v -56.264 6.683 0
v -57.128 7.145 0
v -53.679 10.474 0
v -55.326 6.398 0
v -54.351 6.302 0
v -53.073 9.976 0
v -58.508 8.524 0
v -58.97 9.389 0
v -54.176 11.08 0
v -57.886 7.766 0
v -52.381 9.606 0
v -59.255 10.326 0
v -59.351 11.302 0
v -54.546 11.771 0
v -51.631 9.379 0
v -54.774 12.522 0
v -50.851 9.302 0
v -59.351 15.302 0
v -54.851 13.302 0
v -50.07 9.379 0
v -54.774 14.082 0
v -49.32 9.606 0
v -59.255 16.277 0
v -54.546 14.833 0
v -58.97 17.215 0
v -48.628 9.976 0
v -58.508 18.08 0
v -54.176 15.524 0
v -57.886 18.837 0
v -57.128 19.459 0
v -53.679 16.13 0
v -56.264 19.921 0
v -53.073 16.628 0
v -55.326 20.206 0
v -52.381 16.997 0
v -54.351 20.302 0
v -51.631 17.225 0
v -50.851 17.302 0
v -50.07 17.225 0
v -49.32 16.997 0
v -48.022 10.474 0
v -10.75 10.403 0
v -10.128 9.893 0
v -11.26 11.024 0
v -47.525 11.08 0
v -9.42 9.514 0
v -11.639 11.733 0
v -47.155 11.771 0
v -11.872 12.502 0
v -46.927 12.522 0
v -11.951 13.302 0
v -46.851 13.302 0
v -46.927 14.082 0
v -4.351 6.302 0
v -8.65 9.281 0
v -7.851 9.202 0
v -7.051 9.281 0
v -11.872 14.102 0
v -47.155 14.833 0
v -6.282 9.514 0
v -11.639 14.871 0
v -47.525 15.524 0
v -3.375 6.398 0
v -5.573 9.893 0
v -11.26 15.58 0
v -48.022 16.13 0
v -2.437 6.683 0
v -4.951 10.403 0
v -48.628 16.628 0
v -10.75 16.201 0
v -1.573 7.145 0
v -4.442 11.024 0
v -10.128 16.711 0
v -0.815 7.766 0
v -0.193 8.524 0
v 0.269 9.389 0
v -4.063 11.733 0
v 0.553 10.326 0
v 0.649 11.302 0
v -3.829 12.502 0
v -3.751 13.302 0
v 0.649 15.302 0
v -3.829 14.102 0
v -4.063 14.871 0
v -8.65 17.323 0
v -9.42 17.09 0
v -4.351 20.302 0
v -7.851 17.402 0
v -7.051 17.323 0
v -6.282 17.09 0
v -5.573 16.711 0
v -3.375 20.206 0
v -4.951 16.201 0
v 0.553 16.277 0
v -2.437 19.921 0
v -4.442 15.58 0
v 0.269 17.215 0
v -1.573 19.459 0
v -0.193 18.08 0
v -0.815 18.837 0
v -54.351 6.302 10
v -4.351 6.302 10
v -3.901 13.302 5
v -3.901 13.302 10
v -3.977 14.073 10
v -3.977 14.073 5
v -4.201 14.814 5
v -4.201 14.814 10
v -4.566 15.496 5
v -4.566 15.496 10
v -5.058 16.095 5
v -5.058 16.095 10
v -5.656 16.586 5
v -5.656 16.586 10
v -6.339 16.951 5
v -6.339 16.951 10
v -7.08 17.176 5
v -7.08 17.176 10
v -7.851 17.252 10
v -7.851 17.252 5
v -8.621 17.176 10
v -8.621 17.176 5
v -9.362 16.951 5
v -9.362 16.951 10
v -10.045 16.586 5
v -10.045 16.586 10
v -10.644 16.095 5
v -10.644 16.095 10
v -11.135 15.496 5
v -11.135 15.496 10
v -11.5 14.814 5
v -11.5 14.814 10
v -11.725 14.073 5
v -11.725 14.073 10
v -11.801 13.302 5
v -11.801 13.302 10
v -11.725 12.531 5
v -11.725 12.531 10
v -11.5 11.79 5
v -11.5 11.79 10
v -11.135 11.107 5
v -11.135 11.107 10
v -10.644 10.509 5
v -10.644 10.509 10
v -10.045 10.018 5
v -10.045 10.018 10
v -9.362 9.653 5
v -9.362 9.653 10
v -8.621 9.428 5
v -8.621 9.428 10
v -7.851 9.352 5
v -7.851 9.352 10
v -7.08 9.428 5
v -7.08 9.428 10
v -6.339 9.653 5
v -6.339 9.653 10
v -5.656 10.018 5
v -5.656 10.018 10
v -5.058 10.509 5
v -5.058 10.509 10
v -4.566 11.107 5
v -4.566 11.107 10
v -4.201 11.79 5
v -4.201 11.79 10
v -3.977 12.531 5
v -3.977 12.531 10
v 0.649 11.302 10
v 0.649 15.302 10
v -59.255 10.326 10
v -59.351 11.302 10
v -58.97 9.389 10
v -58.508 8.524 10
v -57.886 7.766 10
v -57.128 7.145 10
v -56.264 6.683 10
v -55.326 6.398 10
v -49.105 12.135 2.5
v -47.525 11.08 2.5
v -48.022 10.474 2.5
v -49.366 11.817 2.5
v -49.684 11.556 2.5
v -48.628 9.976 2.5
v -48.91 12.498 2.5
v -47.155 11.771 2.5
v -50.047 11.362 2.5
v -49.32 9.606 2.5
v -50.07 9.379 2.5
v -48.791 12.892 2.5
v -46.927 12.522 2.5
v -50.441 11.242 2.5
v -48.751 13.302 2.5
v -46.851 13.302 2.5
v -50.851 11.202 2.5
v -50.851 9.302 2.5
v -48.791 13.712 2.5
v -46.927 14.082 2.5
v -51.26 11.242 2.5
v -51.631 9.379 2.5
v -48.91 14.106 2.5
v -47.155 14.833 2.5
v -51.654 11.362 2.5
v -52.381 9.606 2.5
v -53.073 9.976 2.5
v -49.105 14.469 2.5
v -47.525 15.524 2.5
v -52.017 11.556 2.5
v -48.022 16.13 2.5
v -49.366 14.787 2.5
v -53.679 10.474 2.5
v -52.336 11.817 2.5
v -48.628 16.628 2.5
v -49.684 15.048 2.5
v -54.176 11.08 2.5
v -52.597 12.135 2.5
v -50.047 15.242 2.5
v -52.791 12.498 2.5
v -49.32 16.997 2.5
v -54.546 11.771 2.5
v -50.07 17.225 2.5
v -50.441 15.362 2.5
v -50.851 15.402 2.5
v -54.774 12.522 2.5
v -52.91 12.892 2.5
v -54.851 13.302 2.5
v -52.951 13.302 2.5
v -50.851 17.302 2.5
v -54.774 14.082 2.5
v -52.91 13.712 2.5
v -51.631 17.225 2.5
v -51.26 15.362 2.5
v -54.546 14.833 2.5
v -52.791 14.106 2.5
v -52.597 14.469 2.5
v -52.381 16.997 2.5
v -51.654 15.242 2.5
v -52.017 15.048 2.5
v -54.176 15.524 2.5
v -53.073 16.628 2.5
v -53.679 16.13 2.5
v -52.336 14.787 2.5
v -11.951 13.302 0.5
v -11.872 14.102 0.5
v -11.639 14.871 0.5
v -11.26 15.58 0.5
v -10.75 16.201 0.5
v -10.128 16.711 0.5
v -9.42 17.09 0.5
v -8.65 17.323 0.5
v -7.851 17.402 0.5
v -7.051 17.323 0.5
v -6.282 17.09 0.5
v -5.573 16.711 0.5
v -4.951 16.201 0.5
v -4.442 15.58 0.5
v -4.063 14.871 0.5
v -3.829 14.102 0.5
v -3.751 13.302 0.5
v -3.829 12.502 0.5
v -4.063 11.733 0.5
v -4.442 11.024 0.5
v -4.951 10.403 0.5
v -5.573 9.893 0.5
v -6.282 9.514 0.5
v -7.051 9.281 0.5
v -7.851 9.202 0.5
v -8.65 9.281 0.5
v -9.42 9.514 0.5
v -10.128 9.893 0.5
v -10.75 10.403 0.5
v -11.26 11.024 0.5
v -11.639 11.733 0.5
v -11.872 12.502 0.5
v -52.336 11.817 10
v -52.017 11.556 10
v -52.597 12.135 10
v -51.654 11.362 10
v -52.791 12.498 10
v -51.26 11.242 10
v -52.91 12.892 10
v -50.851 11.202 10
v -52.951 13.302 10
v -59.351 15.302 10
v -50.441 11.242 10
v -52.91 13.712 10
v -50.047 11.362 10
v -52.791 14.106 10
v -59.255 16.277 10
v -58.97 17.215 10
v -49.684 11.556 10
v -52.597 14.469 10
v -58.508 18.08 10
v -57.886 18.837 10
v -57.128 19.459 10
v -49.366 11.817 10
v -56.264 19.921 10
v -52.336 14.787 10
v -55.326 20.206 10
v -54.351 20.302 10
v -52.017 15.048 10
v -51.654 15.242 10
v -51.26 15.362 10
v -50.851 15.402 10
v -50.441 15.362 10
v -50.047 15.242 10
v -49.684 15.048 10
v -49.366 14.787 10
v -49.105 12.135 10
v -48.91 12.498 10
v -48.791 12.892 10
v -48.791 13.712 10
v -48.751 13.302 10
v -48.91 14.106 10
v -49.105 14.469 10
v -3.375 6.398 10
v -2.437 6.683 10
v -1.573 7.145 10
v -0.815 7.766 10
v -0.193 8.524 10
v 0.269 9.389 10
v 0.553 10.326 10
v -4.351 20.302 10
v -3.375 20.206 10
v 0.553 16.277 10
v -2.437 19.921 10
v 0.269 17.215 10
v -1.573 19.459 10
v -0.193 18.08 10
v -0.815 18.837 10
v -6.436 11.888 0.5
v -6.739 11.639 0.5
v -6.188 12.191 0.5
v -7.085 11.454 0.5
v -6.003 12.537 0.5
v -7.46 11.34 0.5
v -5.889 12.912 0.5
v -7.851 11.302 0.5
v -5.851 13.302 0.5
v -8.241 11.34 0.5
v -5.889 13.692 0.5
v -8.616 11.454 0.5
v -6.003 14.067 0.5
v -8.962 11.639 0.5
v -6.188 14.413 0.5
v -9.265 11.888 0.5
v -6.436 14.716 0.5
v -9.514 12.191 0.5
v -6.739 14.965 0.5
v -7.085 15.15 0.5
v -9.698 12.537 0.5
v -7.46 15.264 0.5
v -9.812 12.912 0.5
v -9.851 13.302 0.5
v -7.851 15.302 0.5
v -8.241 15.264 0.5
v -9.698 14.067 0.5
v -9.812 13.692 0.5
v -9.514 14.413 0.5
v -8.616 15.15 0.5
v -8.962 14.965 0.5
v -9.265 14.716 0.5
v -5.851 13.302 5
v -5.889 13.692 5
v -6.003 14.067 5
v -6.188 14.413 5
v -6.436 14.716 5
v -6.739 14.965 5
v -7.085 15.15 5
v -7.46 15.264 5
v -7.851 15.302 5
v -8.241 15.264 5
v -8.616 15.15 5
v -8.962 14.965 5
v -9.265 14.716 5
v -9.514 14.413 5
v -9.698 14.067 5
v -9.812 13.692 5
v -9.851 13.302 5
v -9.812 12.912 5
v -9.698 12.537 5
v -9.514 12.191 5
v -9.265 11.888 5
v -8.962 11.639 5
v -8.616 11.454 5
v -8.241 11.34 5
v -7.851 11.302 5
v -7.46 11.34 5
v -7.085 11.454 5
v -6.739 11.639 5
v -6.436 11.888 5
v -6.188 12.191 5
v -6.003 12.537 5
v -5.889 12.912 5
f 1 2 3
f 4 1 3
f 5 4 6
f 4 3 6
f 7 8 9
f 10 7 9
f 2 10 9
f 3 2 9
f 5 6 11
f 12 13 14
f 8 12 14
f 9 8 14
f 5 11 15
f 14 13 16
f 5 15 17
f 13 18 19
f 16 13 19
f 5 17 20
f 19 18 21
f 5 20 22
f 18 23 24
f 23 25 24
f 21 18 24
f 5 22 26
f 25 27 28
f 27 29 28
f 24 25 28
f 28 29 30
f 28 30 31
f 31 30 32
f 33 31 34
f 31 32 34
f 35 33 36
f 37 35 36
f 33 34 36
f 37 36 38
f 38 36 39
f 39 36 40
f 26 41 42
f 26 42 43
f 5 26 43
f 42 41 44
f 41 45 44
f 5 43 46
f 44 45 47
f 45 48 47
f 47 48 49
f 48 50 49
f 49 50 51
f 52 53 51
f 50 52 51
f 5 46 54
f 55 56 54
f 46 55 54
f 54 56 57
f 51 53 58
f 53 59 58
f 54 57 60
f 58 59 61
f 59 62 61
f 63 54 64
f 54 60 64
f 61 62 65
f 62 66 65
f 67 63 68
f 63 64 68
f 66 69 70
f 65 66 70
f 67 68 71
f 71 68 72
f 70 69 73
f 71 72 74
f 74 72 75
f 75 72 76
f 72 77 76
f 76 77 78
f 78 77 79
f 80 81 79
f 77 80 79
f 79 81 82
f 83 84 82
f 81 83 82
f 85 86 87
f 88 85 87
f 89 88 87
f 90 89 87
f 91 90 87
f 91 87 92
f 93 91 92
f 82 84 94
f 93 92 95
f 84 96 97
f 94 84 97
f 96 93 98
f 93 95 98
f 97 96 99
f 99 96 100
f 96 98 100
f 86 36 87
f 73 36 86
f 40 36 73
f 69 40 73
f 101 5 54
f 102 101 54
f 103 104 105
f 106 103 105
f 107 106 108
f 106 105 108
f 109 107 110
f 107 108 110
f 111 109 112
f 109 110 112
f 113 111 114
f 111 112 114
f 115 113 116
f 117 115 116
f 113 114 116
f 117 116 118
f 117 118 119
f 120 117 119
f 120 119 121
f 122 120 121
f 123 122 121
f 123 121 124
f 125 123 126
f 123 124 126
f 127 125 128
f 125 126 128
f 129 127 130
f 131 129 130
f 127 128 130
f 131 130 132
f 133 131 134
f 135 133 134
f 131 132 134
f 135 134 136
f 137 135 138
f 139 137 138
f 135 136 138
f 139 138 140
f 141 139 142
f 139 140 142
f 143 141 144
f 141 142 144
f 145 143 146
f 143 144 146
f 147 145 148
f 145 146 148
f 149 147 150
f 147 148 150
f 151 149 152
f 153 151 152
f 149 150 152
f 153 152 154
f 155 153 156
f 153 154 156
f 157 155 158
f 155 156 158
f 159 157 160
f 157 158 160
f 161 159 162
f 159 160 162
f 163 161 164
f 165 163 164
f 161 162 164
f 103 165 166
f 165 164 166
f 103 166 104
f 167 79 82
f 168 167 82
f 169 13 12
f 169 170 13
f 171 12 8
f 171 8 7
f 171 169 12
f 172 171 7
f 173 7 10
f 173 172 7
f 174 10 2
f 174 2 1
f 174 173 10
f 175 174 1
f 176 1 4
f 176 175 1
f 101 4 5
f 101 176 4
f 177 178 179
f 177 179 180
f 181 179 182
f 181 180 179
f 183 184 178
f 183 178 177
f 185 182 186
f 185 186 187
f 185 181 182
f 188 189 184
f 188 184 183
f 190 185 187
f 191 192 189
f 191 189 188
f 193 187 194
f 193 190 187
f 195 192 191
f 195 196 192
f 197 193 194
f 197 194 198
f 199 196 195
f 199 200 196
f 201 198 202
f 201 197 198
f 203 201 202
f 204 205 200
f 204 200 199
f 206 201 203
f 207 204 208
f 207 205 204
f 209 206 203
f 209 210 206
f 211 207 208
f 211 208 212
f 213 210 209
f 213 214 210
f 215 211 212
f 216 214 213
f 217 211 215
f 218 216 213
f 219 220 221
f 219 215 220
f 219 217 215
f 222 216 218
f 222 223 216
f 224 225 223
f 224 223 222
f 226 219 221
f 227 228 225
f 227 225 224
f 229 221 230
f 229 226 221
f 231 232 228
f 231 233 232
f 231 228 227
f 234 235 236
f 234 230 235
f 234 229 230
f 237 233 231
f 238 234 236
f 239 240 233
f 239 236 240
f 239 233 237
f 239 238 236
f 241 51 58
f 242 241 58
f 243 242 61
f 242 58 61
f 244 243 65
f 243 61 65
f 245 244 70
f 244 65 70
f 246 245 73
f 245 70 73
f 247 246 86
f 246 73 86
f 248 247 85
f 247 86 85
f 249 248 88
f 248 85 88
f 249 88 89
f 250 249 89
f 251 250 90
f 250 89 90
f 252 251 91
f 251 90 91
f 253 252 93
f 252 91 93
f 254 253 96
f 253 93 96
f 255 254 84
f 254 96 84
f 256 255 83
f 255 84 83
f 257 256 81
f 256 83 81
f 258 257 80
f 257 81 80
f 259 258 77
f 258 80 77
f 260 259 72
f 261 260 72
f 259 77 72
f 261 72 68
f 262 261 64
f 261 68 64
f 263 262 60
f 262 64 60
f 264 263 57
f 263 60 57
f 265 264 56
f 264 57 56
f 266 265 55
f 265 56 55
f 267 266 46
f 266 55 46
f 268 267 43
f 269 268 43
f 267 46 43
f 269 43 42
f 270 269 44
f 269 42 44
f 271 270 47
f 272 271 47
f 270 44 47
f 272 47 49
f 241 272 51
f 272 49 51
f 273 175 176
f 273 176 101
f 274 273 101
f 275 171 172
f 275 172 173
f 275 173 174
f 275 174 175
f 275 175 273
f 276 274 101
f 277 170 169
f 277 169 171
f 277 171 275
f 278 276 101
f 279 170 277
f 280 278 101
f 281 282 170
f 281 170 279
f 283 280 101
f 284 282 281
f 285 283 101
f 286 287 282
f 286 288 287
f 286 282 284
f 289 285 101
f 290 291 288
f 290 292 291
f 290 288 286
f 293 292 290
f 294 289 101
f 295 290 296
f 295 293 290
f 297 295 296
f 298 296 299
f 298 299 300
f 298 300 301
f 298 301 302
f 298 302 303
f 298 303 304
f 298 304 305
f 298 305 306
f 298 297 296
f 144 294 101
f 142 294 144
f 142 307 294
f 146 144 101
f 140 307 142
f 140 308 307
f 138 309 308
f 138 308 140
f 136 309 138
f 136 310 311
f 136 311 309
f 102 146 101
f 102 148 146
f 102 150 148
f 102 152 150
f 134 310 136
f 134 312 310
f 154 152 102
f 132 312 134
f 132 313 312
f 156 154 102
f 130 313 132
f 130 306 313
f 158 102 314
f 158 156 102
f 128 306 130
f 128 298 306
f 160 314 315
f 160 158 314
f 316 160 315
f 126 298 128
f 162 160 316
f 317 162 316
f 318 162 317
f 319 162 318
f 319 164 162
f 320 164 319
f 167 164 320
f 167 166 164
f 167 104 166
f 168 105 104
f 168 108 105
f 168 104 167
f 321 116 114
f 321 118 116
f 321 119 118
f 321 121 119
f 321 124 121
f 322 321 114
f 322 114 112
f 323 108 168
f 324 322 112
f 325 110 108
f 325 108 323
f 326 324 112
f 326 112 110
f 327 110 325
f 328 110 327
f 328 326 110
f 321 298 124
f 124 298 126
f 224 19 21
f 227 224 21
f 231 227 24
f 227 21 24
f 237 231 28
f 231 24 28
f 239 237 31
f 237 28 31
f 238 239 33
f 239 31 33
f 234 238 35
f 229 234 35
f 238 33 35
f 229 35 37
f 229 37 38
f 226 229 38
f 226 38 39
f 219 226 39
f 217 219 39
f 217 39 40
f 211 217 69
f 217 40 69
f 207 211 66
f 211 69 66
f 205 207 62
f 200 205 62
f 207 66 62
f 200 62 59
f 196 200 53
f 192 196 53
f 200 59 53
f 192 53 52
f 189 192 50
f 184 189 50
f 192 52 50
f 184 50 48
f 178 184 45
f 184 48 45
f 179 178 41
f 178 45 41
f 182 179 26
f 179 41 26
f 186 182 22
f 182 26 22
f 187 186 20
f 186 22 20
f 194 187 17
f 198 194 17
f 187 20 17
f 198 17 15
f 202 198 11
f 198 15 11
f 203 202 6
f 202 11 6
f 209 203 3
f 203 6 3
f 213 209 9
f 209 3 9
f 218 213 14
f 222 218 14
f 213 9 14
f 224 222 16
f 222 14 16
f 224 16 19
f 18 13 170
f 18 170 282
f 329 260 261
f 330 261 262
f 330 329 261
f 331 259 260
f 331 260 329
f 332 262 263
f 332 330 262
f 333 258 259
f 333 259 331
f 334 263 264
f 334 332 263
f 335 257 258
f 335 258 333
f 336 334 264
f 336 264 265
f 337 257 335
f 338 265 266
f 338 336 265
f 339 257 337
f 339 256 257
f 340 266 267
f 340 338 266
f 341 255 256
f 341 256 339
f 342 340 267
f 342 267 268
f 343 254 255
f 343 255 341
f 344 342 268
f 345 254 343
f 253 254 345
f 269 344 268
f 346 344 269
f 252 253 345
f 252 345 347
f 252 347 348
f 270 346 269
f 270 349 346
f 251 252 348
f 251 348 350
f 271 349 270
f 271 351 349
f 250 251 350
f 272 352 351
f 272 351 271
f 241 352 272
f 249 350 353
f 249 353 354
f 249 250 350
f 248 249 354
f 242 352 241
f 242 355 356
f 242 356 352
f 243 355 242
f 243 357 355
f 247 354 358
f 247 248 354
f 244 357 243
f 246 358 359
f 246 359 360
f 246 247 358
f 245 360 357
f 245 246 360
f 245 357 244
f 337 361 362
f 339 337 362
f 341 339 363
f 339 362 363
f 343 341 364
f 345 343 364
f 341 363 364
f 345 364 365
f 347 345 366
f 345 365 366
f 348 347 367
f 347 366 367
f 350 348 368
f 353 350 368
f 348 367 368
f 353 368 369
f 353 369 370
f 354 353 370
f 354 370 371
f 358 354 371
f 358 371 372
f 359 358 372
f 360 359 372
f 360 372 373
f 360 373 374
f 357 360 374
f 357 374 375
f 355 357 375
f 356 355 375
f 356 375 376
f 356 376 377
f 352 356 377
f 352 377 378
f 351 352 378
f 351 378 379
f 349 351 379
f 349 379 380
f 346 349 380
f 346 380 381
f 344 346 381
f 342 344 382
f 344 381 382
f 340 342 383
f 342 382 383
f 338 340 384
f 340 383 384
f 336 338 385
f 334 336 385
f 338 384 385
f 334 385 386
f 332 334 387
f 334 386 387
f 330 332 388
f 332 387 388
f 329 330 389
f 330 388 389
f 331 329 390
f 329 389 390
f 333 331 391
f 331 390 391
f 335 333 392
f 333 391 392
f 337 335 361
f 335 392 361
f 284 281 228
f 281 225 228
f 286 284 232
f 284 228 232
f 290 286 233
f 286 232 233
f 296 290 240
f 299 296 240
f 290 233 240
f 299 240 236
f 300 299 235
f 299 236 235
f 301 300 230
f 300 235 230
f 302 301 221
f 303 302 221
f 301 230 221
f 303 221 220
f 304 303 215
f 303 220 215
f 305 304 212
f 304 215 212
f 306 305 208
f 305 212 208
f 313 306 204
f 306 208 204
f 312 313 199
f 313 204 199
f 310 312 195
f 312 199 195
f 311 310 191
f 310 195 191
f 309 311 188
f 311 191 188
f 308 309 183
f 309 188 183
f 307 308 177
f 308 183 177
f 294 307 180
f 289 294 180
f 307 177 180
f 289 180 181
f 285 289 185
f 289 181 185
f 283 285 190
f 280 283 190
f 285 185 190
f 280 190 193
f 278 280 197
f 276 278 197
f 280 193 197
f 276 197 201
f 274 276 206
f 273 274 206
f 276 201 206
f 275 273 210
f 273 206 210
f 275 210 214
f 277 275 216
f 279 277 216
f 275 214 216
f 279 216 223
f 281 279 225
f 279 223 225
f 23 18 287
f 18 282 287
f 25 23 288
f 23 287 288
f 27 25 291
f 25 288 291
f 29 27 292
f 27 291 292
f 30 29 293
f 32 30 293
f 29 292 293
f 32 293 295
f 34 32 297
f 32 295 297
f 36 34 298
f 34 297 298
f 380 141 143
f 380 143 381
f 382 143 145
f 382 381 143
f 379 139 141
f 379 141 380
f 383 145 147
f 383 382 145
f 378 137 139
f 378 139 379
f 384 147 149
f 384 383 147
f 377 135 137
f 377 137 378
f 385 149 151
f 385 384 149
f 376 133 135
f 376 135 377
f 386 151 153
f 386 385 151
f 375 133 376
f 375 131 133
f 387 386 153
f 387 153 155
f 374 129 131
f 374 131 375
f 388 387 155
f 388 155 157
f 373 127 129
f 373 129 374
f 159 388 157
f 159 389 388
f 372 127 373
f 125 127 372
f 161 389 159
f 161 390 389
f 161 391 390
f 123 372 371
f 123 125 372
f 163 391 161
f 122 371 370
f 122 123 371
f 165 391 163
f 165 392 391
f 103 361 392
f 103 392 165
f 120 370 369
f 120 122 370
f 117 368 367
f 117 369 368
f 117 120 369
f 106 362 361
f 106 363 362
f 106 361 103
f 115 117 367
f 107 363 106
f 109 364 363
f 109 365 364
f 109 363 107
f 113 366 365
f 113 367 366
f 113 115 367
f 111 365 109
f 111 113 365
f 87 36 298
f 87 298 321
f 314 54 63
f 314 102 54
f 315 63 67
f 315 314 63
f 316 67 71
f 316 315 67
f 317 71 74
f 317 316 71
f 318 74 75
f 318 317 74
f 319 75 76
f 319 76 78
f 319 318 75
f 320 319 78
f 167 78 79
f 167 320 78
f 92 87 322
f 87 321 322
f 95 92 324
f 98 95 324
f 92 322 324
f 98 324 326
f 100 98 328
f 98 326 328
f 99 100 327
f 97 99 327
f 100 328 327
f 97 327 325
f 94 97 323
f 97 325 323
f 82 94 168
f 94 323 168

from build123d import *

# Parameters (mm, degrees)
SKETCH1_W           = 60
SKETCH1_H           = 14
BOSS_EXTRUDE1_DEPTH = 10
FILLET1_R           = 5
FILLET2_R           = 5
SKETCH2_R           = 4
CUT_EXTRUDE2_DEPTH  = 2.5
SKETCH3_R           = 2.1
CUT_EXTRUDE3_DEPTH  = 2
SKETCH4_R           = 3.95
CUT_EXTRUDE4_DEPTH  = 5
CUT_EXTRUDE5_REACH  = 64.926
SKETCH5_R           = 2
SKETCH7_R           = 2.1
CUT_EXTRUDE6_DEPTH  = 63.967570185
SKETCH6_R           = 4.1
CUT_EXTRUDE7_DEPTH  = 0.5


with BuildPart() as part:
    # Sketch1 → Boss-Extrude1 (new body)
    with BuildSketch(Plane.XY):
        with Locations((-29.350618243, 13.301945946)):
            Rectangle(SKETCH1_W, SKETCH1_H)
    extrude(amount=BOSS_EXTRUDE1_DEPTH)

    # Fillet1
    fillet1_edges = [part.edges().sort_by_distance(p)[0] for p in [
        (-59.350618243, 20.301945946, 5),
    ]]
    fillet(fillet1_edges, radius=FILLET1_R)

    # Fillet2
    fillet2_edges = [part.edges().sort_by_distance(p)[0] for p in [
        (0.649381757, 20.301945946, 5),
        (0.649381757, 6.301945946, 5),
        (-59.350618243, 6.301945946, 5),
    ]]
    fillet(fillet2_edges, radius=FILLET2_R)

    # Sketch2 → Cut-Extrude2 (cut)
    with BuildSketch(Plane(origin=(0, 0, 0), x_dir=(-1, 0, 0), z_dir=(0, 0, -1))):
        with Locations((50.850618243, 13.301945946)):
            Circle(SKETCH2_R)
    extrude(amount=-CUT_EXTRUDE2_DEPTH, mode=Mode.SUBTRACT)

    # Sketch3 → Cut-Extrude3 (cut)
    with BuildSketch(Plane(origin=(0, 0, 2.5), x_dir=(-1, 0, 0), z_dir=(0, 0, -1))):
        with Locations((50.850618243, 13.301945946)):
            Circle(SKETCH3_R)
    extrude(amount=-CUT_EXTRUDE3_DEPTH, mode=Mode.SUBTRACT)

    # Sketch4 → Cut-Extrude4 (cut)
    with BuildSketch(Plane.XY.offset(10)):
        with Locations((-7.850618243, 13.301945946)):
            Circle(SKETCH4_R)
    extrude(amount=-CUT_EXTRUDE4_DEPTH, mode=Mode.SUBTRACT)

    # Sketch5 → Cut-Extrude5 (cut, up to next)
    with BuildSketch(Plane.XY.offset(5), mode=Mode.PRIVATE) as cut_extrude5_sk1:
        with Locations((-7.850618243, 13.301945946)):
            Circle(SKETCH5_R)
    cut_extrude5_tool1 = extrude(cut_extrude5_sk1.sketch, amount=-CUT_EXTRUDE5_REACH, mode=Mode.PRIVATE) & part.part
    add(cut_extrude5_tool1.solids().sort_by_distance((-7.850618, 13.301946, 5))[0], mode=Mode.SUBTRACT)

    # Sketch7 → Cut-Extrude6 (cut, through all)
    with BuildSketch(Plane(origin=(0, 0, 4.5), x_dir=(-1, 0, 0), z_dir=(0, 0, -1))):
        with Locations((50.850618243, 13.301945946)):
            Circle(SKETCH7_R)
    extrude(amount=-CUT_EXTRUDE6_DEPTH, mode=Mode.SUBTRACT)

    # Sketch6 → Cut-Extrude7 (cut)
    with BuildSketch(Plane(origin=(0, 0, 0), x_dir=(-1, 0, 0), z_dir=(0, 0, -1))):
        with Locations((7.850618243, 13.301945946)):
            Circle(SKETCH6_R)
    extrude(amount=-CUT_EXTRUDE7_DEPTH, mode=Mode.SUBTRACT)


solid = part.part
